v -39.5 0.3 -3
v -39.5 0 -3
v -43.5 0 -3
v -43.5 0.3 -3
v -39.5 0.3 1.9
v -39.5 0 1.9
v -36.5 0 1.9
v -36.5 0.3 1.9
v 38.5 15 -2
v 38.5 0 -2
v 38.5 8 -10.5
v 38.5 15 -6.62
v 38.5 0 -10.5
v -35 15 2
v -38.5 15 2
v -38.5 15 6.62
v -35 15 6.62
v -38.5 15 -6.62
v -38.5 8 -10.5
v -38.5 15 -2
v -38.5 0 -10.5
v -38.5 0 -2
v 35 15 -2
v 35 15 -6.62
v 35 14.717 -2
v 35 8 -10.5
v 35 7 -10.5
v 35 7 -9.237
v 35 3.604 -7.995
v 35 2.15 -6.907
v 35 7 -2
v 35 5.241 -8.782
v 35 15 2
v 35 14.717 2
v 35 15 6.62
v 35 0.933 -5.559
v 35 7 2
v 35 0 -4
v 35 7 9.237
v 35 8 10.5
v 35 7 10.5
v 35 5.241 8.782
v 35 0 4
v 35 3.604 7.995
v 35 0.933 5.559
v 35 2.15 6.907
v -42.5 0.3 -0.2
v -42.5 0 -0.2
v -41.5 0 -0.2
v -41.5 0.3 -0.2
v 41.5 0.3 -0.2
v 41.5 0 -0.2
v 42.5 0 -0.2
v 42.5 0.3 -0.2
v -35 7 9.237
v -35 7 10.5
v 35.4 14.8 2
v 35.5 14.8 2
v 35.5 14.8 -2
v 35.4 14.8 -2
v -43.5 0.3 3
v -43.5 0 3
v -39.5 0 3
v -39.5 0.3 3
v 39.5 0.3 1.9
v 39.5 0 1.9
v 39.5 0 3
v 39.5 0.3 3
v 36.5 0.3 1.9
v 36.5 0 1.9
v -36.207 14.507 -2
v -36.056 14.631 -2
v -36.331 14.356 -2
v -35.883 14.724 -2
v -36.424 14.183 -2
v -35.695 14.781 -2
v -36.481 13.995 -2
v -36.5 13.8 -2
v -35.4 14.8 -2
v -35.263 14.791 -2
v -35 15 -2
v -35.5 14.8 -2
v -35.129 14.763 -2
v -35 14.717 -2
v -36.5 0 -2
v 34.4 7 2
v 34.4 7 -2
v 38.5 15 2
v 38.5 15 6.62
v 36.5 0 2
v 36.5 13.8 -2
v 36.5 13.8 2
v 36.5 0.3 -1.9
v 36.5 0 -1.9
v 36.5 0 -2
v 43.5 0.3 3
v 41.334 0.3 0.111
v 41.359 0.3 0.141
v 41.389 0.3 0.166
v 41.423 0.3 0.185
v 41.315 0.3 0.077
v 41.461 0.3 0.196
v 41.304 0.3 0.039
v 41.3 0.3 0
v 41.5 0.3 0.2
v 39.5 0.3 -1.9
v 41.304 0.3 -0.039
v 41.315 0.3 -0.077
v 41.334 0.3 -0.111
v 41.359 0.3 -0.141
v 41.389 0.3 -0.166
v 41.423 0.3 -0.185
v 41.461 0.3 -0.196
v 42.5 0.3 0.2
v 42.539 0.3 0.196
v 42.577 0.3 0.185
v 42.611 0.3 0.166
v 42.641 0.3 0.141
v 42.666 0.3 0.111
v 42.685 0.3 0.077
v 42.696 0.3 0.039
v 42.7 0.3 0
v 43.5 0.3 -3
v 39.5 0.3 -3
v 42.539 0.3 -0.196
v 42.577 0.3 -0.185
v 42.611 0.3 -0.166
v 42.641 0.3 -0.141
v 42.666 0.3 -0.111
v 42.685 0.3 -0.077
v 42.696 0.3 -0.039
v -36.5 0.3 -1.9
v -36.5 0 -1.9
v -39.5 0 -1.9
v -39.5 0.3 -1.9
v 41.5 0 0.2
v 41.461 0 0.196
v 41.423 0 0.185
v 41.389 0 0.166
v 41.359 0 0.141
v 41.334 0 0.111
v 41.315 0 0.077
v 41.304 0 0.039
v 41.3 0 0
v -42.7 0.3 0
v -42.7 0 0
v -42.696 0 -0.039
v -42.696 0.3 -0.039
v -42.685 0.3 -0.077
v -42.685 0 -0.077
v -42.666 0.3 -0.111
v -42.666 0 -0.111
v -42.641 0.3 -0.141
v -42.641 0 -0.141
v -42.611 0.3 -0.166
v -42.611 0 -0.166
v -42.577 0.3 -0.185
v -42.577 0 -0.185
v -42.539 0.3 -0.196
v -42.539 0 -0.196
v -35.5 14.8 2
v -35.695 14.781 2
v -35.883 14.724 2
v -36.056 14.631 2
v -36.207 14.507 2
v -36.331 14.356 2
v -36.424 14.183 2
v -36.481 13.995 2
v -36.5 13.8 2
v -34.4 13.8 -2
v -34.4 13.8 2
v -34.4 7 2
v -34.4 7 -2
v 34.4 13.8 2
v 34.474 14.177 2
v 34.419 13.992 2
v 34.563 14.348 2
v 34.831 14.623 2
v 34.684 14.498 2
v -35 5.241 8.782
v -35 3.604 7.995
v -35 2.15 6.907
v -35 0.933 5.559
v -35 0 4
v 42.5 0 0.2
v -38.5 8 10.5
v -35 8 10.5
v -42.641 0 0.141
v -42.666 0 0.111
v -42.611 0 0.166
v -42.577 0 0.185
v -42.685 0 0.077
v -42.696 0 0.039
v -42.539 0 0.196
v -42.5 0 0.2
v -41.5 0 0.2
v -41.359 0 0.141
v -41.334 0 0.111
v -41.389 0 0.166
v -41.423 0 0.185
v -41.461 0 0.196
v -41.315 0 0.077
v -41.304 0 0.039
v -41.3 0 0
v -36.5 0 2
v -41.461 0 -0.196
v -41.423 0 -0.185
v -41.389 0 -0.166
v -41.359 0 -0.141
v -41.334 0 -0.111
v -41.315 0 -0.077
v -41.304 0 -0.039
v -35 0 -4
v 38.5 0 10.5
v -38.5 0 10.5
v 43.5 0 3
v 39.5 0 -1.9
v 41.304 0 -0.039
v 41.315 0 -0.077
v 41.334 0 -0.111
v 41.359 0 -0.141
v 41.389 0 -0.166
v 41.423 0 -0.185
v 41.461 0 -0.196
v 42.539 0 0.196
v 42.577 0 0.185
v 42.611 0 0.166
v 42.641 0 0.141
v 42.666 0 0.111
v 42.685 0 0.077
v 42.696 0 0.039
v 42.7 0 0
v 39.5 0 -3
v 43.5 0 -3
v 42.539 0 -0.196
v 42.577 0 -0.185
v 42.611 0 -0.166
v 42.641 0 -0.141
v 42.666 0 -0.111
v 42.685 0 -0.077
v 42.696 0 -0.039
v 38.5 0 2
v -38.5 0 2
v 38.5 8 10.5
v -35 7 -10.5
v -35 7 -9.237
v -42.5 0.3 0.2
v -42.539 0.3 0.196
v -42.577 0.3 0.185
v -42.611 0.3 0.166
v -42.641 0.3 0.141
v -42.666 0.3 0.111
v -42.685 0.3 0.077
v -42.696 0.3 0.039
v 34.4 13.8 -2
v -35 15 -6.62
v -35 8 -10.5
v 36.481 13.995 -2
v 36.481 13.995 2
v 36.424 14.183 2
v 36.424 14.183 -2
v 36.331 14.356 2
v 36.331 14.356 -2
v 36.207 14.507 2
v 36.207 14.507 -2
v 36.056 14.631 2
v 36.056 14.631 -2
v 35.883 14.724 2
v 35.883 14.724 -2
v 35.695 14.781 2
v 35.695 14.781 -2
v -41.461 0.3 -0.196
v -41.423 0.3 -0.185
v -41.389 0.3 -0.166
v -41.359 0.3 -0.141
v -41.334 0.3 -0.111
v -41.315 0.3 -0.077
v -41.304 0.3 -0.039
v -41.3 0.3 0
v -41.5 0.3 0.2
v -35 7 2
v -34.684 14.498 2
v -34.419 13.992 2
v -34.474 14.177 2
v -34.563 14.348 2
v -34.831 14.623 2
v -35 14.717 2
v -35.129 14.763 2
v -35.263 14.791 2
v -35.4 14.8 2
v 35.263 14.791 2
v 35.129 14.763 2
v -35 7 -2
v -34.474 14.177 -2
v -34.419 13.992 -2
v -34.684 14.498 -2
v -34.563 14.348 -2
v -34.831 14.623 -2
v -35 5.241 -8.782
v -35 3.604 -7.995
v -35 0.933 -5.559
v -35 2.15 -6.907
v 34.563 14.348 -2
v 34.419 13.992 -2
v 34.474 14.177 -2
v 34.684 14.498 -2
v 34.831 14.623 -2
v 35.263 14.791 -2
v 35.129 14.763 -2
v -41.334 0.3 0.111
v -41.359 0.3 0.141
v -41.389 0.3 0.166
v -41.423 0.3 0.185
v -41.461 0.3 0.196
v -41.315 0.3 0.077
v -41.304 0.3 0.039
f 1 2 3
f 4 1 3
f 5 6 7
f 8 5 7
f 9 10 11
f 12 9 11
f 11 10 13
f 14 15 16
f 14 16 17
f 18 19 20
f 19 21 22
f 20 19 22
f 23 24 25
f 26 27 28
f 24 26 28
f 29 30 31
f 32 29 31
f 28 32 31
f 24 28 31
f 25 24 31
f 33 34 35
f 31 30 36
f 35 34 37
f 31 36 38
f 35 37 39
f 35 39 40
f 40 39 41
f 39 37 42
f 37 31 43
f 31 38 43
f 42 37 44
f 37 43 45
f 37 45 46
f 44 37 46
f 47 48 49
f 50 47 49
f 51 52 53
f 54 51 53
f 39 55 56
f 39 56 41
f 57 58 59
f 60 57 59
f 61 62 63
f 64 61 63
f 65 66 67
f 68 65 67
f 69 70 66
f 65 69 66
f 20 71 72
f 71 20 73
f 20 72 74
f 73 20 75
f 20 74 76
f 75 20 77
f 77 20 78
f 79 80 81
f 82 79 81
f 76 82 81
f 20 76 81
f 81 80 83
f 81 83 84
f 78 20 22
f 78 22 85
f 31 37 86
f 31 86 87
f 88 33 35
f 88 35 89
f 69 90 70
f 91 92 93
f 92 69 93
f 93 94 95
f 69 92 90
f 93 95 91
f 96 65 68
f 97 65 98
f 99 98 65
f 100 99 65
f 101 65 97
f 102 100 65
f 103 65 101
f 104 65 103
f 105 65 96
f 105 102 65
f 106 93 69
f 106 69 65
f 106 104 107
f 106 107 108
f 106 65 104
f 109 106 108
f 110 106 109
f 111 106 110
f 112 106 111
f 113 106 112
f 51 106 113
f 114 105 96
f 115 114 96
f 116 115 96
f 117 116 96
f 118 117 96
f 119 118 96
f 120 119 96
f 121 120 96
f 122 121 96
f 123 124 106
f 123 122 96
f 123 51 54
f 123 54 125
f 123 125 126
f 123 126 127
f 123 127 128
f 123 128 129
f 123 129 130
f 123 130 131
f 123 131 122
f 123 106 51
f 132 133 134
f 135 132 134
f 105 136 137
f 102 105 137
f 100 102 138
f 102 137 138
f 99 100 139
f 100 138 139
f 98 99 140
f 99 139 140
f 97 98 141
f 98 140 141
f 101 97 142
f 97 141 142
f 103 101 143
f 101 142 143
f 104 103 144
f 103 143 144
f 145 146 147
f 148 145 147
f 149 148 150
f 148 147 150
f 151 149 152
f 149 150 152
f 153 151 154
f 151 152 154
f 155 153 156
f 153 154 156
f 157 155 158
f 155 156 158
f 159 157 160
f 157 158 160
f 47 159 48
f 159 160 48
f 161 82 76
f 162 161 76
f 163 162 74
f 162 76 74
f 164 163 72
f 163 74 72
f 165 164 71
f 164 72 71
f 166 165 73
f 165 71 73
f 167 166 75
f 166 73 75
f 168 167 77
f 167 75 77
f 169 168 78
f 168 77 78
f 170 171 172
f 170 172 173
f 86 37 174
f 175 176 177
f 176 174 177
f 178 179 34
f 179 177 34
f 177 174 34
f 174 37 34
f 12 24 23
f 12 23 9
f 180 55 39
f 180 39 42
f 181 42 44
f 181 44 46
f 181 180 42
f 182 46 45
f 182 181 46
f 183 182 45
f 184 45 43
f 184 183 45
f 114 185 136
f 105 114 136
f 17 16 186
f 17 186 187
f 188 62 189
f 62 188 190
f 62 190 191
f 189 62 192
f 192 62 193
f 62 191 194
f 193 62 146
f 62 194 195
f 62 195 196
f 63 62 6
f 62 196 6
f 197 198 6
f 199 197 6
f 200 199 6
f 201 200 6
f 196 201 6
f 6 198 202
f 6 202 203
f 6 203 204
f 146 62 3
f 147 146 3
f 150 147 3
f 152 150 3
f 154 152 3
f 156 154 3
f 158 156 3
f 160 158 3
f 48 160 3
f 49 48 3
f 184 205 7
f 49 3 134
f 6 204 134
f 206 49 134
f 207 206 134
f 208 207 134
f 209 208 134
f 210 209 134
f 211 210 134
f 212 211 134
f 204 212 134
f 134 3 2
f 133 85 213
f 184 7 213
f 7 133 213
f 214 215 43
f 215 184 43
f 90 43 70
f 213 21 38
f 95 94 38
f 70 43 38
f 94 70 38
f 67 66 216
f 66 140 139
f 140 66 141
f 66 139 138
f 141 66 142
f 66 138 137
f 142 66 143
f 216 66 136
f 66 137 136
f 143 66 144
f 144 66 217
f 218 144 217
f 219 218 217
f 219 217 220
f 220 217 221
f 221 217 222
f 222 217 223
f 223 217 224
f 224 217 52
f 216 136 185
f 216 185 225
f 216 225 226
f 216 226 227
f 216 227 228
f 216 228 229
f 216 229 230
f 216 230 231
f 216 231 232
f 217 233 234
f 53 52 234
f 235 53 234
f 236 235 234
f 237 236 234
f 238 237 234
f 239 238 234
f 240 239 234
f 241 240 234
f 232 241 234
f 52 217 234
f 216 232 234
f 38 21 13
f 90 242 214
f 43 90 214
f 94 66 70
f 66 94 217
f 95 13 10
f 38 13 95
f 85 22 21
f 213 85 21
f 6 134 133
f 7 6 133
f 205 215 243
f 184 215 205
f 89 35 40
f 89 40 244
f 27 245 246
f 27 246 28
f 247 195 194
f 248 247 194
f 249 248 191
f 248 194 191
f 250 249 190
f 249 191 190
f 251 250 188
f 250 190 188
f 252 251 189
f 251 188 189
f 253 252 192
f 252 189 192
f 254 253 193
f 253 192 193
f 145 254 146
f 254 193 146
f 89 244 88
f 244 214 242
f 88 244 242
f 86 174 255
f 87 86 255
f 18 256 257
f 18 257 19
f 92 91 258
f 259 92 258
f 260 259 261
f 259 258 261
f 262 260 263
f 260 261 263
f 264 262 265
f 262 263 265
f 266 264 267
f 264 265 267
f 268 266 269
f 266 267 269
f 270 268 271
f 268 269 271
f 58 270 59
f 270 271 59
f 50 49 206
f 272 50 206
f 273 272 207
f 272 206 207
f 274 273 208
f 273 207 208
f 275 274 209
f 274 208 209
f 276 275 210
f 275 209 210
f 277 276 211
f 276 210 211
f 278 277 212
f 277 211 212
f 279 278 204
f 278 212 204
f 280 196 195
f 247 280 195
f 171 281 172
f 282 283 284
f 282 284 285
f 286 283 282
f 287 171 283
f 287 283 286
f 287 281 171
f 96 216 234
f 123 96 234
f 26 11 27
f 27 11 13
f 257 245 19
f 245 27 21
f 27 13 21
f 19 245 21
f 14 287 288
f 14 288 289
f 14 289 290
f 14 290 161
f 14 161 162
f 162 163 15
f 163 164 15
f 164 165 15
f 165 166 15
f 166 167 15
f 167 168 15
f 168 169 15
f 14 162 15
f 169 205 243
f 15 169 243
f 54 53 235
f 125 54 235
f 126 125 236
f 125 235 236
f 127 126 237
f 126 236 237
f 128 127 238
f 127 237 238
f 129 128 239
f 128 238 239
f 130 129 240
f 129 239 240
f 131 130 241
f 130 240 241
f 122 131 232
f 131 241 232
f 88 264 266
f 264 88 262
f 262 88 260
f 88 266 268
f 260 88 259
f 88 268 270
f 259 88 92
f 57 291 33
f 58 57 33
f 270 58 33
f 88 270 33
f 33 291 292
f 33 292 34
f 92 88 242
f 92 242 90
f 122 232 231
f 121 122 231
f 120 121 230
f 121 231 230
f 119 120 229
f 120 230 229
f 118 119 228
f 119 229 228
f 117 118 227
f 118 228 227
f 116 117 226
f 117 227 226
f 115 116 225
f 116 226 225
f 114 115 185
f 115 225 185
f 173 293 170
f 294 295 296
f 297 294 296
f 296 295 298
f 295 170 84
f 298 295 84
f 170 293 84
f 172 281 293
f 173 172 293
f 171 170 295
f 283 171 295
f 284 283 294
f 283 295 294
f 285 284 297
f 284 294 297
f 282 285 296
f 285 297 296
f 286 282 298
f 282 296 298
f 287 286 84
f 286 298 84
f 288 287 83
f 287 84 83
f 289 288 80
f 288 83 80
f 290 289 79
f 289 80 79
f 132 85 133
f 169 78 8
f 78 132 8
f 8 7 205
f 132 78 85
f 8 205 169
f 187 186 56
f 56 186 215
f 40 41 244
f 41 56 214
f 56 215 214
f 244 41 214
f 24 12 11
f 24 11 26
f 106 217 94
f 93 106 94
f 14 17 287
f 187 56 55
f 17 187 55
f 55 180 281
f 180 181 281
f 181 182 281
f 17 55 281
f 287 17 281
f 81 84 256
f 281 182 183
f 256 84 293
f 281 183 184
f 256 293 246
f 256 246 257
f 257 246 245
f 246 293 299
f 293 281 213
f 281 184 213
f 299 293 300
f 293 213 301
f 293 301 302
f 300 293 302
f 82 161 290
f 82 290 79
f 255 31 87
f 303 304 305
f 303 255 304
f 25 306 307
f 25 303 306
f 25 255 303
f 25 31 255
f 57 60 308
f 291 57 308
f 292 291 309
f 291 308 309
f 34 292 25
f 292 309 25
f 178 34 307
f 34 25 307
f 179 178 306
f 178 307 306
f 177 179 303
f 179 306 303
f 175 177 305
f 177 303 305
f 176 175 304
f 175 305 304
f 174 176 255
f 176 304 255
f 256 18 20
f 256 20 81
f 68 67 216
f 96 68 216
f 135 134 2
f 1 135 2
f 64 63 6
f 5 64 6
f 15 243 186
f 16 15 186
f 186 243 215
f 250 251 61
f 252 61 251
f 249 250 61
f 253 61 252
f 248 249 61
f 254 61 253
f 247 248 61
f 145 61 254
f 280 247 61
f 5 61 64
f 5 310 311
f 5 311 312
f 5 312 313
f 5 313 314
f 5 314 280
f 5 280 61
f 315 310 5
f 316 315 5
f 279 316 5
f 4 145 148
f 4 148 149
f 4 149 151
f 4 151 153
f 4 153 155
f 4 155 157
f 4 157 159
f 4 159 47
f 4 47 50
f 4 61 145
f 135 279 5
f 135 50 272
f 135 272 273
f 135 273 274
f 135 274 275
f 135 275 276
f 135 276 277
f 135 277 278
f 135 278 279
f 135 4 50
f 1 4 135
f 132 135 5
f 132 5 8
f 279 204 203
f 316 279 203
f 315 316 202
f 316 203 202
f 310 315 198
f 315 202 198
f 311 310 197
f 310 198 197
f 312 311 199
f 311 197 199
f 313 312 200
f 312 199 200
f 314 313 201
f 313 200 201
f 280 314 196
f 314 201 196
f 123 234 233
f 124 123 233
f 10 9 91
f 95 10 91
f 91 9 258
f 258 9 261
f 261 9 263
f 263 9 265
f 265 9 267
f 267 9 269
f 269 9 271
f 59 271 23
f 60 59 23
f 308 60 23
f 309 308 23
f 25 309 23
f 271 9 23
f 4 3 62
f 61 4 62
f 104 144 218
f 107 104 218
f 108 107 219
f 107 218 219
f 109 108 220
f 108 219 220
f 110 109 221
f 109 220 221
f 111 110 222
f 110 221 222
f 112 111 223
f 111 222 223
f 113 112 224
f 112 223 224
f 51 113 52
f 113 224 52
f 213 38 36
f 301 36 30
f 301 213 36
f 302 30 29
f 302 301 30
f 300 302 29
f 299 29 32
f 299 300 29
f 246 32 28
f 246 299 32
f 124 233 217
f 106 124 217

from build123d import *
from OCP.BRepFilletAPI import BRepFilletAPI_MakeChamfer

# Parameters (mm, degrees)
DODANIE_WYCI_GNI_CIE1_DEPTH   = 15
DODANIE_WYCI_GNI_CIE1_2_DEPTH = 15
SZKIC1_3_W                    = 70
SZKIC1_3_H                    = 6.5
DODANIE_WYCI_GNI_CIE2_DEPTH   = 7
SZKIC2_R                      = 9.35
WYTNIJ_WYCI_GNI_CIE1_DEPTH    = 70
DODANIE_WYCI_GNI_CIE3_DEPTH   = 0.3
SFAZOWANIE1_SIZE              = 7
SFAZOWANIE1_SIZE2             = 3.88016336
WYTNIJ_WYCI_GNI_CIE2_REACH    = 82.607
SZKIC4_W                      = 4
SZKIC4_H                      = 0.2
SZKIC4_3_W                    = 4
SZKIC4_3_H                    = 7.8
DODANIE_WYCI_GNI_CIE4_DEPTH   = 0.6
ZAOKR_GLENIE1_R               = 1


with BuildPart() as part:
    # Szkic1 → Dodanie-wyciągnięcie1 (new body)
    with BuildSketch(Plane(origin=(0, 0, 0), x_dir=(1, 0, 0), z_dir=(0, 1, 0))):
        Polygon((-38.5, -2), (-38.5, -10.5), (-35, -10.5), (-35, 10.5), (-38.5, 10.5), (-38.5, 2), (-36.5, 2), (-36.5, -2), align=None)
    extrude(amount=DODANIE_WYCI_GNI_CIE1_DEPTH)



with BuildPart() as body_2:
    # Szkic1 → Dodanie-wyci_gni_cie1 2 (new body)
    with BuildSketch(Plane(origin=(0, 0, 0), x_dir=(1, 0, 0), z_dir=(0, 1, 0))):
        Polygon((35, 10.5), (35, -10.5), (38.5, -10.5), (38.5, -2), (36.5, -2), (36.5, 2), (38.5, 2), (38.5, 10.5), align=None)
    extrude(amount=DODANIE_WYCI_GNI_CIE1_2_DEPTH)


with BuildPart() as part_1:
    add(part.part)

    add(body_2.part)  # Dodanie-wyciągnięcie2 merges body 2
    # Szkic1<3> → Dodanie-wyciągnięcie2 (add)
    with BuildSketch(Plane(origin=(0, 0, 0), x_dir=(1, 0, 0), z_dir=(0, 1, 0))):
        with Locations((0, -7.25)):
            Rectangle(SZKIC1_3_W, SZKIC1_3_H)
        with Locations((0, 7.25)):
            Rectangle(SZKIC1_3_W, SZKIC1_3_H)
    extrude(amount=DODANIE_WYCI_GNI_CIE2_DEPTH)

    # Szkic2 → Wytnij-wyciągnięcie1 (cut)
    with BuildSketch(Plane(origin=(-35, 0, 0), x_dir=(0, 0, -1), z_dir=(1, 0, 0))):
        with Locations((0, 8.451183349)):
            Circle(SZKIC2_R)
    extrude(amount=WYTNIJ_WYCI_GNI_CIE1_DEPTH, mode=Mode.SUBTRACT)

    # Szkic3 → Dodanie-wyciągnięcie3 (add)
    with BuildSketch(Plane(origin=(0, 0, 0), x_dir=(1, 0, 0), z_dir=(0, 1, 0))):
        with BuildLine():
            Line((-36.5, 0), (-36.5, 1.9))
            Line((-36.5, 1.9), (-39.5, 1.9))
            Line((-39.5, 1.9), (-39.5, 3))
            Line((-39.5, 3), (-43.5, 3))
            Line((-43.5, 3), (-43.5, 0))
            Line((-43.5, 0), (-42.7, 0))
            ThreePointArc((-42.7, 0), (-42.641421356, 0.141421356), (-42.5, 0.2))
            Line((-42.5, 0.2), (-41.5, 0.2))
            ThreePointArc((-41.5, 0.2), (-41.358578644, 0.141421356), (-41.3, 0))
            Line((-41.3, 0), (-36.5, 0))
        make_face()
        with BuildLine():
            Line((-36.5, -1.9), (-36.5, 0))
            Line((-36.5, 0), (-41.3, 0))
            ThreePointArc((-41.3, 0), (-41.358578644, -0.141421356), (-41.5, -0.2))
            Line((-41.5, -0.2), (-42.5, -0.2))
            ThreePointArc((-42.5, -0.2), (-42.641421356, -0.141421356), (-42.7, 0))
            Line((-42.7, 0), (-43.5, 0))
            Line((-43.5, 0), (-43.5, -3))
            Line((-43.5, -3), (-39.5, -3))
            Line((-39.5, -3), (-39.5, -1.9))
            Line((-39.5, -1.9), (-36.5, -1.9))
        make_face()
        with BuildLine():
            Line((41.5, 0.2), (42.5, 0.2))
            ThreePointArc((42.5, 0.2), (42.641421356, 0.141421356), (42.7, 0))
            Line((42.7, 0), (43.5, 0))
            Line((43.5, 0), (43.5, 3))
            Line((43.5, 3), (39.5, 3))
            Line((39.5, 3), (39.5, 1.9))
            Line((39.5, 1.9), (36.5, 1.9))
            Line((36.5, 1.9), (36.5, 0))
            Line((36.5, 0), (41.3, 0))
            ThreePointArc((41.3, 0), (41.358578644, 0.141421356), (41.5, 0.2))
        make_face()
        with BuildLine():
            Line((43.5, 0), (42.7, 0))
            ThreePointArc((42.7, 0), (42.641421356, -0.141421356), (42.5, -0.2))
            Line((42.5, -0.2), (41.5, -0.2))
            ThreePointArc((41.5, -0.2), (41.358578644, -0.141421356), (41.3, 0))
            Line((41.3, 0), (36.5, 0))
            Line((36.5, 0), (36.5, -1.9))
            Line((36.5, -1.9), (39.5, -1.9))
            Line((39.5, -1.9), (39.5, -3))
            Line((39.5, -3), (43.5, -3))
            Line((43.5, -3), (43.5, 0))
        make_face()
    extrude(amount=DODANIE_WYCI_GNI_CIE3_DEPTH)

    # Sfazowanie1: one chamfer whose edges measure the first distance from different faces: ONE call of the kernel's chamfer builder (chamfer() names one face for all edges)
    sfazowanie1_edges_1 = [part_1.edges().sort_by_distance(p)[0] for p in [
        (-36.75, 15, 10.5),
        (36.75, 15, 10.5),
    ]]
    sfazowanie1_side_1 = [part_1.faces().sort_by_distance(p)[0] for p in [
        (0, 4.205882353, 10.5),
    ]]
    sfazowanie1_edges_2 = [part_1.edges().sort_by_distance(p)[0] for p in [
        (-36.75, 15, -10.5),
        (36.75, 15, -10.5),
    ]]
    sfazowanie1_side_2 = [part_1.faces().sort_by_distance(p)[0] for p in [
        (0, 4.205882353, -10.5),
    ]]
    sfazowanie1 = BRepFilletAPI_MakeChamfer(part_1.part.solid().wrapped)
    for e in sfazowanie1_edges_1:
        sfazowanie1.Add(SFAZOWANIE1_SIZE, SFAZOWANIE1_SIZE2, e.wrapped, sfazowanie1_side_1[0].wrapped)  # the first distance lies on this face
    for e in sfazowanie1_edges_2:
        sfazowanie1.Add(SFAZOWANIE1_SIZE, SFAZOWANIE1_SIZE2, e.wrapped, sfazowanie1_side_2[0].wrapped)  # the first distance lies on this face
    add(Compound.cast(sfazowanie1.Shape()), mode=Mode.REPLACE)

    # Szkic4 → Wytnij-wyciągnięcie2 (cut, up to next)
    with BuildSketch(Plane(origin=(-35, 0, 0), x_dir=(0, 0, -1), z_dir=(1, 0, 0)), mode=Mode.PRIVATE) as wytnij_wyci_gni_cie2_sk1:
        with Locations((0, 14.9)):
            Rectangle(SZKIC4_W, SZKIC4_H)
    wytnij_wyci_gni_cie2_tool1 = extrude(wytnij_wyci_gni_cie2_sk1.sketch, amount=-WYTNIJ_WYCI_GNI_CIE2_REACH, mode=Mode.PRIVATE) & part_1.part
    wytnij_wyci_gni_cie2 = wytnij_wyci_gni_cie2_tool1.solids().sort_by_distance((-35, 14.9, 0))[0]
    add(wytnij_wyci_gni_cie2, mode=Mode.SUBTRACT)

    # Szkic4<3> → Dodanie-wyciągnięcie4 (add)
    with BuildSketch(Plane(origin=(-35, 0, 0), x_dir=(0, 0, -1), z_dir=(1, 0, 0))):
        with Locations((0, 10.9)):
            Rectangle(SZKIC4_3_W, SZKIC4_3_H)
    dodanie_wyci_gni_cie4 = extrude(amount=DODANIE_WYCI_GNI_CIE4_DEPTH)

    # Lustro1: Wytnij-wyciągnięcie2, Dodanie-wyciągnięcie4 across plane
    add(wytnij_wyci_gni_cie2.mirror(Plane(origin=(0, 0, 0), x_dir=(0, 0, 1), z_dir=(1, 0, 0))), mode=Mode.SUBTRACT)
    add(dodanie_wyci_gni_cie4.mirror(Plane(origin=(0, 0, 0), x_dir=(0, 0, 1), z_dir=(1, 0, 0))))

    # Zaokrąglenie1
    # the kernel refuses this fillet: 1 mm, written as the material it takes off along each edge
    with BuildSketch(Plane(origin=(-36.5, 14.8, -2), x_dir=(0, -1, 0), z_dir=(0, 0, 1)), Plane(origin=(-34.4, 14.8, -2), x_dir=(-1, 0, 0), z_dir=(0, 0, 1))) as zaokr_glenie1_piece_1:
        with BuildLine():
            CenterArc((ZAOKR_GLENIE1_R, ZAOKR_GLENIE1_R), ZAOKR_GLENIE1_R, 180, 90)
            Line((0, ZAOKR_GLENIE1_R), (0, 0))
            Line((0, 0), (ZAOKR_GLENIE1_R, 0))
        make_face()
    extrude(amount=4, mode=Mode.SUBTRACT)
    with BuildSketch(Plane(origin=(36.5, 14.8, -2), x_dir=(0, -1, 0), z_dir=(0, 0, 1)), Plane(origin=(34.4, 14.8, -2), x_dir=(1, 0, 0), z_dir=(0, 0, 1))) as zaokr_glenie1_piece_2:
        with BuildLine():
            CenterArc((ZAOKR_GLENIE1_R, -ZAOKR_GLENIE1_R), ZAOKR_GLENIE1_R, 90, 90)
            Line((0, -ZAOKR_GLENIE1_R), (0, 0))
            Line((0, 0), (ZAOKR_GLENIE1_R, 0))
        make_face()
    extrude(amount=4, mode=Mode.SUBTRACT)


solid = part_1.part
